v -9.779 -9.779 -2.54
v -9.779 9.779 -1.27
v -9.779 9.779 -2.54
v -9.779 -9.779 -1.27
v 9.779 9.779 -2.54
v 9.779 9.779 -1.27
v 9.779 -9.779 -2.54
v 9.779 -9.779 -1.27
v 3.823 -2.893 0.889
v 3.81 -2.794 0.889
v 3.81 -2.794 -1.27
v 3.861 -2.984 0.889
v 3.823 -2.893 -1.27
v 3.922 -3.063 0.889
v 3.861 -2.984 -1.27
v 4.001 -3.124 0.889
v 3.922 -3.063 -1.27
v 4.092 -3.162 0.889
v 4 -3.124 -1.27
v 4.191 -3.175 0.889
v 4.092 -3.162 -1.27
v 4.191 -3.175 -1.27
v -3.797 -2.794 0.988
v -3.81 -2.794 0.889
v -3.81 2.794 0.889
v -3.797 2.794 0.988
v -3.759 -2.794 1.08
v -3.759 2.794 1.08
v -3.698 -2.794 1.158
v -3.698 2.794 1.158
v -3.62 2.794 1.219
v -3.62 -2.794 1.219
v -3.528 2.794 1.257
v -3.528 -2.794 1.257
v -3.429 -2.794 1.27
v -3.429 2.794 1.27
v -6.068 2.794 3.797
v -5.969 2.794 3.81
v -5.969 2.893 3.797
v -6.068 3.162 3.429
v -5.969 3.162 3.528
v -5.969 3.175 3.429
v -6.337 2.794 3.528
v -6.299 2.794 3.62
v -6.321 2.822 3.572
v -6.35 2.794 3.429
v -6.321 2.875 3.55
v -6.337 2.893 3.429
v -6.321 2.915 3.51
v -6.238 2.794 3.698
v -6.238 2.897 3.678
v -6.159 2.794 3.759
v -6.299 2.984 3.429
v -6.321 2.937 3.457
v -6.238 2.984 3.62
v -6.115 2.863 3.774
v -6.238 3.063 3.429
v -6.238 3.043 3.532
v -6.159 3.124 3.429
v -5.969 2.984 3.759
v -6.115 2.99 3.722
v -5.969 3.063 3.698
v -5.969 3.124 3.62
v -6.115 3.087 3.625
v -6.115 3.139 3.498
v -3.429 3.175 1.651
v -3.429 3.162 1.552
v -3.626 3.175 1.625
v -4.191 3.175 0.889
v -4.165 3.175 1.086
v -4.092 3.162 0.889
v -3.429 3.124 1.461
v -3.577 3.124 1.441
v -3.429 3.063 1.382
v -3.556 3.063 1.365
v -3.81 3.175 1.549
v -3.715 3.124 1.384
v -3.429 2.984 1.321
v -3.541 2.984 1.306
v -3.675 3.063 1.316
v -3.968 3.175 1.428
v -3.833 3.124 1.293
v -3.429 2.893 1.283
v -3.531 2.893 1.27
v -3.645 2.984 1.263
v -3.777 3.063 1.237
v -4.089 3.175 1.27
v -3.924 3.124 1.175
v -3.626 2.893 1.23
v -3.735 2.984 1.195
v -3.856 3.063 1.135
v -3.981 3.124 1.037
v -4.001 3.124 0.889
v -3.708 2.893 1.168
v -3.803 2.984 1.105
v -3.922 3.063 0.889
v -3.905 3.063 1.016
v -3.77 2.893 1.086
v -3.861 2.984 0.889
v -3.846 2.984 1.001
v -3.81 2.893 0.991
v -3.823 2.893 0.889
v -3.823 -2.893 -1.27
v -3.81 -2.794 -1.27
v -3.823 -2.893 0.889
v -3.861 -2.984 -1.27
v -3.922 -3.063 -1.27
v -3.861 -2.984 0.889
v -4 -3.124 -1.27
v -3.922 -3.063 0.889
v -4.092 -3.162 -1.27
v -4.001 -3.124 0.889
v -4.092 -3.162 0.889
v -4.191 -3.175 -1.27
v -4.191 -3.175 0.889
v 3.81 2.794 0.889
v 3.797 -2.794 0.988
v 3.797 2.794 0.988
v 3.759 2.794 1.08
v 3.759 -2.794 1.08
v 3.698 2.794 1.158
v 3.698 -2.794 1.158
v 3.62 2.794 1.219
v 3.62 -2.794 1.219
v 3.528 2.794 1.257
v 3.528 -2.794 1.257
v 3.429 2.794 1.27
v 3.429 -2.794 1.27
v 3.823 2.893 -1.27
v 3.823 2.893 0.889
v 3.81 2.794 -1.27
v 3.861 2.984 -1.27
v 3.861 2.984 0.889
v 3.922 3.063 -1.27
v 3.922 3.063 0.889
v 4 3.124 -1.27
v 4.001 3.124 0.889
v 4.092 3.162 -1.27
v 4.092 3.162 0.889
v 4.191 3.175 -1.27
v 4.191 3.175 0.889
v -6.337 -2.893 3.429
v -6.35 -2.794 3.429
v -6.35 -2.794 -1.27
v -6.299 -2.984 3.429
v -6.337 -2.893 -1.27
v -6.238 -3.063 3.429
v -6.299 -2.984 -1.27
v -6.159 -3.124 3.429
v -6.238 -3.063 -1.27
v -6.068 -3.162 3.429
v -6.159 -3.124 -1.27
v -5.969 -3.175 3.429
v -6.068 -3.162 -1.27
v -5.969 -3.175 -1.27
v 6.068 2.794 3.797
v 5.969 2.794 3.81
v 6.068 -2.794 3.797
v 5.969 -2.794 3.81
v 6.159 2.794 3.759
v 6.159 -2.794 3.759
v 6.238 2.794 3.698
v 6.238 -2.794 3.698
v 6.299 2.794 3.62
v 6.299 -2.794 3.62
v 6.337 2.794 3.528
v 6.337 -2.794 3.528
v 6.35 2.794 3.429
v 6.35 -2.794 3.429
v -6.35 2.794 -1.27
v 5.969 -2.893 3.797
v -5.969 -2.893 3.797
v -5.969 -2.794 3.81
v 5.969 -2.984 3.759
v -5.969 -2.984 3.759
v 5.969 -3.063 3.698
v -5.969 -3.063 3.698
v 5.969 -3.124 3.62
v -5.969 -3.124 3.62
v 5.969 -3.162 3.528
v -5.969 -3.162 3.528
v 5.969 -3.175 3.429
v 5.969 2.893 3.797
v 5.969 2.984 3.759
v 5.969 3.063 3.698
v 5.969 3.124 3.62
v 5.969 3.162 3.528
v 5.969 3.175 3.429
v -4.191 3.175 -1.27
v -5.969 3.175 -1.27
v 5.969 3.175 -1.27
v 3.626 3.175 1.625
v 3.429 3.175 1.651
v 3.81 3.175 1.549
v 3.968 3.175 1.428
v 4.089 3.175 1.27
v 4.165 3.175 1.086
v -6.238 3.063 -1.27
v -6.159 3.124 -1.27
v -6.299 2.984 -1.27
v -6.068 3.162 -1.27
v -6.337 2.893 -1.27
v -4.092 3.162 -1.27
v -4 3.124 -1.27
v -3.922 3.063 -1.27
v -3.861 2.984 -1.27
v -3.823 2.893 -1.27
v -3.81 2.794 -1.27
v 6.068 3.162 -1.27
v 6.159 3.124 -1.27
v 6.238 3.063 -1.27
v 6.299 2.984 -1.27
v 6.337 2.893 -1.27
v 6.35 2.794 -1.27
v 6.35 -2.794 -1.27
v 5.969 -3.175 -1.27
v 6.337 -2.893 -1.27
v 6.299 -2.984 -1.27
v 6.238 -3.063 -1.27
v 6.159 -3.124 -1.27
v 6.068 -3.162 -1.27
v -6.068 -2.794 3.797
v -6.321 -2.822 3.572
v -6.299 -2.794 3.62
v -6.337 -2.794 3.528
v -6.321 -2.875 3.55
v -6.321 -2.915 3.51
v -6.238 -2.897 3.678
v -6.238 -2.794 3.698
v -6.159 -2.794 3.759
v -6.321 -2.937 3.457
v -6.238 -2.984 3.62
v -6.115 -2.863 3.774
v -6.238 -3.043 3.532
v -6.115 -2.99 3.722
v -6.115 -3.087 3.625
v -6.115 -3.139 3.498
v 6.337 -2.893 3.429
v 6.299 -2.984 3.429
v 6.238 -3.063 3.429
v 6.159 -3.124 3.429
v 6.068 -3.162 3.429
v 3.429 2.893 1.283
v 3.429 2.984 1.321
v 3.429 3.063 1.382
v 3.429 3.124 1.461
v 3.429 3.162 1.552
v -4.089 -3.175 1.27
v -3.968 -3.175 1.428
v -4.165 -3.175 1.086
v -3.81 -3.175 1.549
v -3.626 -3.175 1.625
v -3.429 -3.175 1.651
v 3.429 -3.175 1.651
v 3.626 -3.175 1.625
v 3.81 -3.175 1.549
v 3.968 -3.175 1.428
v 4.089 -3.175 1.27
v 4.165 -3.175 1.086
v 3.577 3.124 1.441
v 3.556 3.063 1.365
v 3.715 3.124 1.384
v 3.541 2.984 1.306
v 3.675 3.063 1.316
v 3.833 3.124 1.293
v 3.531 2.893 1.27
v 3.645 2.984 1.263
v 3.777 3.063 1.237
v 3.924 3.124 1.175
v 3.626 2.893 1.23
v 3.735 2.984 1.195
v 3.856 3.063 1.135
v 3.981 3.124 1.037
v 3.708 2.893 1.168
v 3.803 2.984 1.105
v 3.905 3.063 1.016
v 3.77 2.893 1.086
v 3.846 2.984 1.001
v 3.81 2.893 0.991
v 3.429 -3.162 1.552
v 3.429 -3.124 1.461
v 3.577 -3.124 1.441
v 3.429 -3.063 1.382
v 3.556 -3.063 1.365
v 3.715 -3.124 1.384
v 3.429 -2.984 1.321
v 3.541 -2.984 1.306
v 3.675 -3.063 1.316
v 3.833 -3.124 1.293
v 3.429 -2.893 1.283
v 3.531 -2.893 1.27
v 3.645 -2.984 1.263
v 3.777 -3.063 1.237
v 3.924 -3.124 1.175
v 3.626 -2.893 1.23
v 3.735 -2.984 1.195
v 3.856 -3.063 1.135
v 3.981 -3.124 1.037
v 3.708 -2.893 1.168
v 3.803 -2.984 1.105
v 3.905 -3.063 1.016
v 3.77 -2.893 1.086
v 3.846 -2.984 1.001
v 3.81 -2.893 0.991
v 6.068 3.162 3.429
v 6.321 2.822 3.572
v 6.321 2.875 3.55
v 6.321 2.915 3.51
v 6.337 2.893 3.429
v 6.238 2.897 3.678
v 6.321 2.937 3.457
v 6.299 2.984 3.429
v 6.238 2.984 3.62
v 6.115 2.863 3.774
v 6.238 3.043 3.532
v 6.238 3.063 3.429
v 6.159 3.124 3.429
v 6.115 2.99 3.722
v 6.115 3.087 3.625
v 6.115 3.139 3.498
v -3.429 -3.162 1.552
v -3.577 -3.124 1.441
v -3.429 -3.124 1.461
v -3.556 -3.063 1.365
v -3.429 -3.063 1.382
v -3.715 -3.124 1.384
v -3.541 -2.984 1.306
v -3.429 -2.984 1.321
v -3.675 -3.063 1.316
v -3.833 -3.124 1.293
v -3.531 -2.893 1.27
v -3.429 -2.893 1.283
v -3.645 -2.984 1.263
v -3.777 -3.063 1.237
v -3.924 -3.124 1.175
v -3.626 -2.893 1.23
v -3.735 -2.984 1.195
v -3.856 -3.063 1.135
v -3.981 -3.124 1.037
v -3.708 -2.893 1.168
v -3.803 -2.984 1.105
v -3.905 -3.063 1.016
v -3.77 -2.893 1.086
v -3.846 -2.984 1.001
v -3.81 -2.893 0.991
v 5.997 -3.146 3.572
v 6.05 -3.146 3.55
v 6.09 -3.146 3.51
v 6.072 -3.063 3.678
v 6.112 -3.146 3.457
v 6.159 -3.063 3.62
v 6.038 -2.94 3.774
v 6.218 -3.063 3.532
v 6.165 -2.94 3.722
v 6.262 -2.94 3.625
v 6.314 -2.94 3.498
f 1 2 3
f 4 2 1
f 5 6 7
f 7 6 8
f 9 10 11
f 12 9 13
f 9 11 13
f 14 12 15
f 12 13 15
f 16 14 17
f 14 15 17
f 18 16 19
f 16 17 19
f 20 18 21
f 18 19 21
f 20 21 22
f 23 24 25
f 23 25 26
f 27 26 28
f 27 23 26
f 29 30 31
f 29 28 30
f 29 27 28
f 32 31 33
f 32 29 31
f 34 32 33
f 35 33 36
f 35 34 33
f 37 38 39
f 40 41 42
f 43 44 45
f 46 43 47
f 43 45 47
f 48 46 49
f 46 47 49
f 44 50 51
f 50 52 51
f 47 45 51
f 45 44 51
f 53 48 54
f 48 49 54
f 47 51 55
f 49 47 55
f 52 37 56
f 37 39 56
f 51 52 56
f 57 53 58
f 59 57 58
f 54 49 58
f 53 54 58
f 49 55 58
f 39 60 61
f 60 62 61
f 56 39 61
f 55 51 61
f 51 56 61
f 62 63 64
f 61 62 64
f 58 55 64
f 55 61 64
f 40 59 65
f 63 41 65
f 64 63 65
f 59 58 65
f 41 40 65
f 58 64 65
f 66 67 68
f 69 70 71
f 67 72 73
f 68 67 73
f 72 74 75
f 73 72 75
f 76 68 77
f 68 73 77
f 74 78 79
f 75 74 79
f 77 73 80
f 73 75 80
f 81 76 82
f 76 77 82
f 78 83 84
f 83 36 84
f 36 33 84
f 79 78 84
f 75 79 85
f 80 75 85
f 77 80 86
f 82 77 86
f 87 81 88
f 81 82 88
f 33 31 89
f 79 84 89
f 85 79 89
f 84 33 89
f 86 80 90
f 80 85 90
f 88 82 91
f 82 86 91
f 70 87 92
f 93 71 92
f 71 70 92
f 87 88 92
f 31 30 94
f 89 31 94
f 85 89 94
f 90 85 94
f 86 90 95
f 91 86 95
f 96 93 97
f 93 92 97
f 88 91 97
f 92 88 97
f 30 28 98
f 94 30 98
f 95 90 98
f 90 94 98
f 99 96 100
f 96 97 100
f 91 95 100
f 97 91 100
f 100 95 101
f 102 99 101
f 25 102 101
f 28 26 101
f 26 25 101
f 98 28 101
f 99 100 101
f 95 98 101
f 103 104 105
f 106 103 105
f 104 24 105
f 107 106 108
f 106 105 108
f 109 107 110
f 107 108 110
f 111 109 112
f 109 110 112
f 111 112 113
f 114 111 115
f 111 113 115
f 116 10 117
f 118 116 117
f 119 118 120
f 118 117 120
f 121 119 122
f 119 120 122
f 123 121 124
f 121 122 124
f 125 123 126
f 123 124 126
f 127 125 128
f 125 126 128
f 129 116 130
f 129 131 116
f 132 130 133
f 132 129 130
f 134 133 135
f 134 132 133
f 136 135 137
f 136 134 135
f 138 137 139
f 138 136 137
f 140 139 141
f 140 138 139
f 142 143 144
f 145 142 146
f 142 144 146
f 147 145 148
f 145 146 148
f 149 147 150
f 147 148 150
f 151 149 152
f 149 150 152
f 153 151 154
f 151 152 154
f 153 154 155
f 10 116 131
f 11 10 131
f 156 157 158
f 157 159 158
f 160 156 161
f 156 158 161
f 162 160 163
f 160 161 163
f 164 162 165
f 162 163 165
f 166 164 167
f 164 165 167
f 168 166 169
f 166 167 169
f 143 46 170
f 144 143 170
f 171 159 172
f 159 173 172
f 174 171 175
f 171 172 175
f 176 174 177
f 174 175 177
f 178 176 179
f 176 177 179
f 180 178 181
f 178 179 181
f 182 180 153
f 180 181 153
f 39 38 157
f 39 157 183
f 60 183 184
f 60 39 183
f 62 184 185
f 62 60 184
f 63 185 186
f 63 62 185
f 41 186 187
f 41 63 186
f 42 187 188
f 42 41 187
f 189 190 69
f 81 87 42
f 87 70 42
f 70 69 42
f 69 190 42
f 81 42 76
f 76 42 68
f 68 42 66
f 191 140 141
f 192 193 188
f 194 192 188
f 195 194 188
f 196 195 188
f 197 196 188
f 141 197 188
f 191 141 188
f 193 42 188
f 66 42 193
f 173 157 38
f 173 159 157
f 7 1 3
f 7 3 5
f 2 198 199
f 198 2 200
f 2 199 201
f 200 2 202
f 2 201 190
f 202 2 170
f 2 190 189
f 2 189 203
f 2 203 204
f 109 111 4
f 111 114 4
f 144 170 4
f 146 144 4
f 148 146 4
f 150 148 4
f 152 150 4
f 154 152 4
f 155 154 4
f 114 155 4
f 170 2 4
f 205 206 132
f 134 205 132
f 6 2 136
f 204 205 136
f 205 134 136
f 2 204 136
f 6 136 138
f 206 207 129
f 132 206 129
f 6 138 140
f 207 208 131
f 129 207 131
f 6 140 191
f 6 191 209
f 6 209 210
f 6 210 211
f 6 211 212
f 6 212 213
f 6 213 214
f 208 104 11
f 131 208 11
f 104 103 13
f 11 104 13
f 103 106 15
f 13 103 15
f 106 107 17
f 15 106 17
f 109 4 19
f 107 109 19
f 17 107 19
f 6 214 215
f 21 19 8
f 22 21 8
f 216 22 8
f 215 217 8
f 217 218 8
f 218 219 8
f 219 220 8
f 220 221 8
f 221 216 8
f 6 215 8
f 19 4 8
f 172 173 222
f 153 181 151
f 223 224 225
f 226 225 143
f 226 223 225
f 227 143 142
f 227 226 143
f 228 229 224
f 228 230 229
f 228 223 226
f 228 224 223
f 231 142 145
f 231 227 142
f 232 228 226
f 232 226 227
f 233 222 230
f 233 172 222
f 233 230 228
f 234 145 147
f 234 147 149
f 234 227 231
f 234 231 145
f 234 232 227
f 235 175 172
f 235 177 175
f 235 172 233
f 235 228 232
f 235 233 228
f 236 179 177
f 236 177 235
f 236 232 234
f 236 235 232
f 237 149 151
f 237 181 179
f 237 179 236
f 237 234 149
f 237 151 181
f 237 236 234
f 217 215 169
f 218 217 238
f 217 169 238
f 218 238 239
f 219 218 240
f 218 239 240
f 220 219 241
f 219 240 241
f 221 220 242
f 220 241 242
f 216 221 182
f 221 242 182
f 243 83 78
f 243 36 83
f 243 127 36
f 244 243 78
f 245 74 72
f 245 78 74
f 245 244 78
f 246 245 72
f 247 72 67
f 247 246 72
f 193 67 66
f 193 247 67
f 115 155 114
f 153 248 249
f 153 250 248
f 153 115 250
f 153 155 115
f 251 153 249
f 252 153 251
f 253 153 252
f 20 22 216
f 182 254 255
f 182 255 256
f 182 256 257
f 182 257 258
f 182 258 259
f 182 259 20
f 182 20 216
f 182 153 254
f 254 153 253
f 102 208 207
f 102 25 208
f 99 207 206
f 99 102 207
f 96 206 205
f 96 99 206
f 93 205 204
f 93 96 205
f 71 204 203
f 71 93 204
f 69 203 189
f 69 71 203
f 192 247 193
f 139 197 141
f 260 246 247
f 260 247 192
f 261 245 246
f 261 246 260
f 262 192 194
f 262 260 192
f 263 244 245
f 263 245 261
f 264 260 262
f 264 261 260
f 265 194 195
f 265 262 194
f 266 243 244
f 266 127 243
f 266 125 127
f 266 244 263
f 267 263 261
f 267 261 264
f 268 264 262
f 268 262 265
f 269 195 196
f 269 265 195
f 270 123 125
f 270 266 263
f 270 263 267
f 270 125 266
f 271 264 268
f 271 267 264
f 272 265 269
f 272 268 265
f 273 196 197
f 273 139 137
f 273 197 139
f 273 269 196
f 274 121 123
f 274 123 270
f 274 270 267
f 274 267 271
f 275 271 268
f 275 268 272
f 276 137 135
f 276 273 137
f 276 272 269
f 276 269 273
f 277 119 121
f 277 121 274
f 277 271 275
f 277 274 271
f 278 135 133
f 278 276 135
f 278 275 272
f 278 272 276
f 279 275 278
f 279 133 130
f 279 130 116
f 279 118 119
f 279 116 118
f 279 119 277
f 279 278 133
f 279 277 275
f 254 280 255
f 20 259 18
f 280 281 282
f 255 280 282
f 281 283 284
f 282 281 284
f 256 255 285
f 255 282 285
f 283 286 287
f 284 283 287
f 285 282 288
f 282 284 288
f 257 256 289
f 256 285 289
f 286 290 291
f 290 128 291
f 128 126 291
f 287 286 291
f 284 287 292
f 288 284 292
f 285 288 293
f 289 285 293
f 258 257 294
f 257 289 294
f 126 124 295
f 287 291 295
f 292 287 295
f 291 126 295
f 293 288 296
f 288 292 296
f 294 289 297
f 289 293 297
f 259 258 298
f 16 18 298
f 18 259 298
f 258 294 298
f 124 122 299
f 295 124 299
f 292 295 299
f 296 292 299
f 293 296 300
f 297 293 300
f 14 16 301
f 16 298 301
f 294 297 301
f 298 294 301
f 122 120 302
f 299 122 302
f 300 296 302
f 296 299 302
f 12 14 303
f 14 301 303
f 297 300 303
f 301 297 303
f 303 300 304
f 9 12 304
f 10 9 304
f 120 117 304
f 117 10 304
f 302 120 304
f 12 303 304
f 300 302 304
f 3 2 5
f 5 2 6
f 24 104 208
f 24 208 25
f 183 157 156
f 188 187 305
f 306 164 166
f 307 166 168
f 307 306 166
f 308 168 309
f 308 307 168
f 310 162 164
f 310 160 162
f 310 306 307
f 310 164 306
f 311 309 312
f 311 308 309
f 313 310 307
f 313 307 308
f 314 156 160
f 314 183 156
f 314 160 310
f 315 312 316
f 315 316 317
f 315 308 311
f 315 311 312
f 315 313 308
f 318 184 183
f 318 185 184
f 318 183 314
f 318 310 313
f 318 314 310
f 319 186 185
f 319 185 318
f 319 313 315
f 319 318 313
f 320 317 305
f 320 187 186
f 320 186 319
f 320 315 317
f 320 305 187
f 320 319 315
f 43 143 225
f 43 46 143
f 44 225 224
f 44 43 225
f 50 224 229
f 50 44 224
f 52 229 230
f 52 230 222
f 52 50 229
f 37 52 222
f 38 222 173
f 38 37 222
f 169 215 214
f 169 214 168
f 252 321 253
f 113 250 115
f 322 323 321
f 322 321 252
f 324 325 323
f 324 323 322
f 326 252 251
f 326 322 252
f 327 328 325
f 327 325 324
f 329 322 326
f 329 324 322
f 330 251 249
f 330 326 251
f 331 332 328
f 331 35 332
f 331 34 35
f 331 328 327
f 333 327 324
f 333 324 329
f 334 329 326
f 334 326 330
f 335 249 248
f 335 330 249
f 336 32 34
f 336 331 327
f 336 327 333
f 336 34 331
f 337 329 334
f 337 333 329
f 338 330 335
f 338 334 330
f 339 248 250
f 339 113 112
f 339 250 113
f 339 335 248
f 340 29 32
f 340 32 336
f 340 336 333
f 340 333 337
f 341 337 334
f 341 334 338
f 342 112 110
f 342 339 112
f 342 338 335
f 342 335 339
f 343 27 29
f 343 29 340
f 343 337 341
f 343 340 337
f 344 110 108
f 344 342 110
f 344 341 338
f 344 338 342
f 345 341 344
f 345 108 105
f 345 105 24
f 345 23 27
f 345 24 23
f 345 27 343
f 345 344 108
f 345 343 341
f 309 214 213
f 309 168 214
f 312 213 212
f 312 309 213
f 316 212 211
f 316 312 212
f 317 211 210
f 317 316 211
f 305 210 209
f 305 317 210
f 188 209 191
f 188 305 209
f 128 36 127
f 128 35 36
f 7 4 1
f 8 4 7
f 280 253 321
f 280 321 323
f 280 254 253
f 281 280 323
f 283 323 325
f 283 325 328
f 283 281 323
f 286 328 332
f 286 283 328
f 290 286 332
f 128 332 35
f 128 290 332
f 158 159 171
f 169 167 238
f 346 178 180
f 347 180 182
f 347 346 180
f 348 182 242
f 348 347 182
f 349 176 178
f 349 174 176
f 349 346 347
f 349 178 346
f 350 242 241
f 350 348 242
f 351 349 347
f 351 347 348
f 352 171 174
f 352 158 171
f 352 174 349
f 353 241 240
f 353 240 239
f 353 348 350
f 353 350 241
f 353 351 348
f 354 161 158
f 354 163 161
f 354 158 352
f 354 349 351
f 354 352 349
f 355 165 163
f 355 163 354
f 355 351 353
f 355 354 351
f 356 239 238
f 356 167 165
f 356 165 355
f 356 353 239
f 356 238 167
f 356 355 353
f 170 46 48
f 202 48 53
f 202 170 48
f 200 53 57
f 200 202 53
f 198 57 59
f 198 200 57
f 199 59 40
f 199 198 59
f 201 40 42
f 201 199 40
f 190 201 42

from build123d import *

# Parameters (mm, degrees)
F1_DEPTH = 3.175
F2_R     = 0.381
F3_W     = 19.558
F3_H     = 19.558
F4_DEPTH = 1.27


with BuildPart() as f1:
    # F0 (on Front) → F1 (new body, symmetric)
    with BuildSketch(Plane.XZ):
        Polygon((-3.81, -1.27), (-3.81, 1.27), (3.81, 1.27), (3.81, -1.27), (6.35, -1.27), (6.35, 3.81), (-6.35, 3.81), (-6.35, -1.27), align=None)
    extrude(amount=F1_DEPTH, both=True)

    # F2
    f2_edges = [f1.edges().sort_by_distance(p)[0] for p in [
        (0, 3.175, 3.81),
        (6.35, 0, 3.81),
        (0, -3.175, 3.81),
        (-6.35, 0, 3.81),
        (-6.35, -3.175, 1.27),
        (-6.35, 3.175, 1.27),
        (0, 3.175, 1.27),
        (-3.81, 3.175, 0),
        (3.81, 3.175, 0),
        (6.35, 3.175, 1.27),
        (6.35, -3.175, 1.27),
        (0, -3.175, 1.27),
        (-3.81, -3.175, 0),
        (3.81, -3.175, 0),
        (-3.81, 0, 1.27),
        (3.81, 0, 1.27),
    ]]
    fillet(f2_edges, radius=F2_R)

    # F3 (on face) → F4 (join)
    with BuildSketch(Plane(origin=(0, 0, -1.27), x_dir=(1, 0, 0), z_dir=(0, 0, -1))):
        Rectangle(F3_W, F3_H)
        with BuildLine():
            Line((3.81, -2.794), (3.81, 2.794))
            ThreePointArc((3.81, 2.794), (3.921592, 3.063408), (4.191, 3.175))
            Line((4.191, 3.175), (5.969, 3.175))
            ThreePointArc((5.969, 3.175), (6.238408, 3.063408), (6.35, 2.794))
            Line((6.35, 2.794), (6.35, -2.794))
            ThreePointArc((6.35, -2.794), (6.238408, -3.063408), (5.969, -3.175))
            Line((5.969, -3.175), (4.191, -3.175))
            ThreePointArc((4.191, -3.175), (3.921592, -3.063408), (3.81, -2.794))
        make_face(mode=Mode.SUBTRACT)
        with BuildLine():
            ThreePointArc((4.191, 3.175), (3.921592, 3.063408), (3.81, 2.794))
            Line((3.81, 2.794), (3.81, -2.794))
            ThreePointArc((3.81, -2.794), (3.921592, -3.063408), (4.191, -3.175))
            Line((4.191, -3.175), (5.969, -3.175))
            ThreePointArc((5.969, -3.175), (6.238408, -3.063408), (6.35, -2.794))
            Line((6.35, -2.794), (6.35, 2.794))
            ThreePointArc((6.35, 2.794), (6.238408, 3.063408), (5.969, 3.175))
            Line((5.969, 3.175), (4.191, 3.175))
        make_face()
    extrude(amount=F4_DEPTH)


solid = f1.part
